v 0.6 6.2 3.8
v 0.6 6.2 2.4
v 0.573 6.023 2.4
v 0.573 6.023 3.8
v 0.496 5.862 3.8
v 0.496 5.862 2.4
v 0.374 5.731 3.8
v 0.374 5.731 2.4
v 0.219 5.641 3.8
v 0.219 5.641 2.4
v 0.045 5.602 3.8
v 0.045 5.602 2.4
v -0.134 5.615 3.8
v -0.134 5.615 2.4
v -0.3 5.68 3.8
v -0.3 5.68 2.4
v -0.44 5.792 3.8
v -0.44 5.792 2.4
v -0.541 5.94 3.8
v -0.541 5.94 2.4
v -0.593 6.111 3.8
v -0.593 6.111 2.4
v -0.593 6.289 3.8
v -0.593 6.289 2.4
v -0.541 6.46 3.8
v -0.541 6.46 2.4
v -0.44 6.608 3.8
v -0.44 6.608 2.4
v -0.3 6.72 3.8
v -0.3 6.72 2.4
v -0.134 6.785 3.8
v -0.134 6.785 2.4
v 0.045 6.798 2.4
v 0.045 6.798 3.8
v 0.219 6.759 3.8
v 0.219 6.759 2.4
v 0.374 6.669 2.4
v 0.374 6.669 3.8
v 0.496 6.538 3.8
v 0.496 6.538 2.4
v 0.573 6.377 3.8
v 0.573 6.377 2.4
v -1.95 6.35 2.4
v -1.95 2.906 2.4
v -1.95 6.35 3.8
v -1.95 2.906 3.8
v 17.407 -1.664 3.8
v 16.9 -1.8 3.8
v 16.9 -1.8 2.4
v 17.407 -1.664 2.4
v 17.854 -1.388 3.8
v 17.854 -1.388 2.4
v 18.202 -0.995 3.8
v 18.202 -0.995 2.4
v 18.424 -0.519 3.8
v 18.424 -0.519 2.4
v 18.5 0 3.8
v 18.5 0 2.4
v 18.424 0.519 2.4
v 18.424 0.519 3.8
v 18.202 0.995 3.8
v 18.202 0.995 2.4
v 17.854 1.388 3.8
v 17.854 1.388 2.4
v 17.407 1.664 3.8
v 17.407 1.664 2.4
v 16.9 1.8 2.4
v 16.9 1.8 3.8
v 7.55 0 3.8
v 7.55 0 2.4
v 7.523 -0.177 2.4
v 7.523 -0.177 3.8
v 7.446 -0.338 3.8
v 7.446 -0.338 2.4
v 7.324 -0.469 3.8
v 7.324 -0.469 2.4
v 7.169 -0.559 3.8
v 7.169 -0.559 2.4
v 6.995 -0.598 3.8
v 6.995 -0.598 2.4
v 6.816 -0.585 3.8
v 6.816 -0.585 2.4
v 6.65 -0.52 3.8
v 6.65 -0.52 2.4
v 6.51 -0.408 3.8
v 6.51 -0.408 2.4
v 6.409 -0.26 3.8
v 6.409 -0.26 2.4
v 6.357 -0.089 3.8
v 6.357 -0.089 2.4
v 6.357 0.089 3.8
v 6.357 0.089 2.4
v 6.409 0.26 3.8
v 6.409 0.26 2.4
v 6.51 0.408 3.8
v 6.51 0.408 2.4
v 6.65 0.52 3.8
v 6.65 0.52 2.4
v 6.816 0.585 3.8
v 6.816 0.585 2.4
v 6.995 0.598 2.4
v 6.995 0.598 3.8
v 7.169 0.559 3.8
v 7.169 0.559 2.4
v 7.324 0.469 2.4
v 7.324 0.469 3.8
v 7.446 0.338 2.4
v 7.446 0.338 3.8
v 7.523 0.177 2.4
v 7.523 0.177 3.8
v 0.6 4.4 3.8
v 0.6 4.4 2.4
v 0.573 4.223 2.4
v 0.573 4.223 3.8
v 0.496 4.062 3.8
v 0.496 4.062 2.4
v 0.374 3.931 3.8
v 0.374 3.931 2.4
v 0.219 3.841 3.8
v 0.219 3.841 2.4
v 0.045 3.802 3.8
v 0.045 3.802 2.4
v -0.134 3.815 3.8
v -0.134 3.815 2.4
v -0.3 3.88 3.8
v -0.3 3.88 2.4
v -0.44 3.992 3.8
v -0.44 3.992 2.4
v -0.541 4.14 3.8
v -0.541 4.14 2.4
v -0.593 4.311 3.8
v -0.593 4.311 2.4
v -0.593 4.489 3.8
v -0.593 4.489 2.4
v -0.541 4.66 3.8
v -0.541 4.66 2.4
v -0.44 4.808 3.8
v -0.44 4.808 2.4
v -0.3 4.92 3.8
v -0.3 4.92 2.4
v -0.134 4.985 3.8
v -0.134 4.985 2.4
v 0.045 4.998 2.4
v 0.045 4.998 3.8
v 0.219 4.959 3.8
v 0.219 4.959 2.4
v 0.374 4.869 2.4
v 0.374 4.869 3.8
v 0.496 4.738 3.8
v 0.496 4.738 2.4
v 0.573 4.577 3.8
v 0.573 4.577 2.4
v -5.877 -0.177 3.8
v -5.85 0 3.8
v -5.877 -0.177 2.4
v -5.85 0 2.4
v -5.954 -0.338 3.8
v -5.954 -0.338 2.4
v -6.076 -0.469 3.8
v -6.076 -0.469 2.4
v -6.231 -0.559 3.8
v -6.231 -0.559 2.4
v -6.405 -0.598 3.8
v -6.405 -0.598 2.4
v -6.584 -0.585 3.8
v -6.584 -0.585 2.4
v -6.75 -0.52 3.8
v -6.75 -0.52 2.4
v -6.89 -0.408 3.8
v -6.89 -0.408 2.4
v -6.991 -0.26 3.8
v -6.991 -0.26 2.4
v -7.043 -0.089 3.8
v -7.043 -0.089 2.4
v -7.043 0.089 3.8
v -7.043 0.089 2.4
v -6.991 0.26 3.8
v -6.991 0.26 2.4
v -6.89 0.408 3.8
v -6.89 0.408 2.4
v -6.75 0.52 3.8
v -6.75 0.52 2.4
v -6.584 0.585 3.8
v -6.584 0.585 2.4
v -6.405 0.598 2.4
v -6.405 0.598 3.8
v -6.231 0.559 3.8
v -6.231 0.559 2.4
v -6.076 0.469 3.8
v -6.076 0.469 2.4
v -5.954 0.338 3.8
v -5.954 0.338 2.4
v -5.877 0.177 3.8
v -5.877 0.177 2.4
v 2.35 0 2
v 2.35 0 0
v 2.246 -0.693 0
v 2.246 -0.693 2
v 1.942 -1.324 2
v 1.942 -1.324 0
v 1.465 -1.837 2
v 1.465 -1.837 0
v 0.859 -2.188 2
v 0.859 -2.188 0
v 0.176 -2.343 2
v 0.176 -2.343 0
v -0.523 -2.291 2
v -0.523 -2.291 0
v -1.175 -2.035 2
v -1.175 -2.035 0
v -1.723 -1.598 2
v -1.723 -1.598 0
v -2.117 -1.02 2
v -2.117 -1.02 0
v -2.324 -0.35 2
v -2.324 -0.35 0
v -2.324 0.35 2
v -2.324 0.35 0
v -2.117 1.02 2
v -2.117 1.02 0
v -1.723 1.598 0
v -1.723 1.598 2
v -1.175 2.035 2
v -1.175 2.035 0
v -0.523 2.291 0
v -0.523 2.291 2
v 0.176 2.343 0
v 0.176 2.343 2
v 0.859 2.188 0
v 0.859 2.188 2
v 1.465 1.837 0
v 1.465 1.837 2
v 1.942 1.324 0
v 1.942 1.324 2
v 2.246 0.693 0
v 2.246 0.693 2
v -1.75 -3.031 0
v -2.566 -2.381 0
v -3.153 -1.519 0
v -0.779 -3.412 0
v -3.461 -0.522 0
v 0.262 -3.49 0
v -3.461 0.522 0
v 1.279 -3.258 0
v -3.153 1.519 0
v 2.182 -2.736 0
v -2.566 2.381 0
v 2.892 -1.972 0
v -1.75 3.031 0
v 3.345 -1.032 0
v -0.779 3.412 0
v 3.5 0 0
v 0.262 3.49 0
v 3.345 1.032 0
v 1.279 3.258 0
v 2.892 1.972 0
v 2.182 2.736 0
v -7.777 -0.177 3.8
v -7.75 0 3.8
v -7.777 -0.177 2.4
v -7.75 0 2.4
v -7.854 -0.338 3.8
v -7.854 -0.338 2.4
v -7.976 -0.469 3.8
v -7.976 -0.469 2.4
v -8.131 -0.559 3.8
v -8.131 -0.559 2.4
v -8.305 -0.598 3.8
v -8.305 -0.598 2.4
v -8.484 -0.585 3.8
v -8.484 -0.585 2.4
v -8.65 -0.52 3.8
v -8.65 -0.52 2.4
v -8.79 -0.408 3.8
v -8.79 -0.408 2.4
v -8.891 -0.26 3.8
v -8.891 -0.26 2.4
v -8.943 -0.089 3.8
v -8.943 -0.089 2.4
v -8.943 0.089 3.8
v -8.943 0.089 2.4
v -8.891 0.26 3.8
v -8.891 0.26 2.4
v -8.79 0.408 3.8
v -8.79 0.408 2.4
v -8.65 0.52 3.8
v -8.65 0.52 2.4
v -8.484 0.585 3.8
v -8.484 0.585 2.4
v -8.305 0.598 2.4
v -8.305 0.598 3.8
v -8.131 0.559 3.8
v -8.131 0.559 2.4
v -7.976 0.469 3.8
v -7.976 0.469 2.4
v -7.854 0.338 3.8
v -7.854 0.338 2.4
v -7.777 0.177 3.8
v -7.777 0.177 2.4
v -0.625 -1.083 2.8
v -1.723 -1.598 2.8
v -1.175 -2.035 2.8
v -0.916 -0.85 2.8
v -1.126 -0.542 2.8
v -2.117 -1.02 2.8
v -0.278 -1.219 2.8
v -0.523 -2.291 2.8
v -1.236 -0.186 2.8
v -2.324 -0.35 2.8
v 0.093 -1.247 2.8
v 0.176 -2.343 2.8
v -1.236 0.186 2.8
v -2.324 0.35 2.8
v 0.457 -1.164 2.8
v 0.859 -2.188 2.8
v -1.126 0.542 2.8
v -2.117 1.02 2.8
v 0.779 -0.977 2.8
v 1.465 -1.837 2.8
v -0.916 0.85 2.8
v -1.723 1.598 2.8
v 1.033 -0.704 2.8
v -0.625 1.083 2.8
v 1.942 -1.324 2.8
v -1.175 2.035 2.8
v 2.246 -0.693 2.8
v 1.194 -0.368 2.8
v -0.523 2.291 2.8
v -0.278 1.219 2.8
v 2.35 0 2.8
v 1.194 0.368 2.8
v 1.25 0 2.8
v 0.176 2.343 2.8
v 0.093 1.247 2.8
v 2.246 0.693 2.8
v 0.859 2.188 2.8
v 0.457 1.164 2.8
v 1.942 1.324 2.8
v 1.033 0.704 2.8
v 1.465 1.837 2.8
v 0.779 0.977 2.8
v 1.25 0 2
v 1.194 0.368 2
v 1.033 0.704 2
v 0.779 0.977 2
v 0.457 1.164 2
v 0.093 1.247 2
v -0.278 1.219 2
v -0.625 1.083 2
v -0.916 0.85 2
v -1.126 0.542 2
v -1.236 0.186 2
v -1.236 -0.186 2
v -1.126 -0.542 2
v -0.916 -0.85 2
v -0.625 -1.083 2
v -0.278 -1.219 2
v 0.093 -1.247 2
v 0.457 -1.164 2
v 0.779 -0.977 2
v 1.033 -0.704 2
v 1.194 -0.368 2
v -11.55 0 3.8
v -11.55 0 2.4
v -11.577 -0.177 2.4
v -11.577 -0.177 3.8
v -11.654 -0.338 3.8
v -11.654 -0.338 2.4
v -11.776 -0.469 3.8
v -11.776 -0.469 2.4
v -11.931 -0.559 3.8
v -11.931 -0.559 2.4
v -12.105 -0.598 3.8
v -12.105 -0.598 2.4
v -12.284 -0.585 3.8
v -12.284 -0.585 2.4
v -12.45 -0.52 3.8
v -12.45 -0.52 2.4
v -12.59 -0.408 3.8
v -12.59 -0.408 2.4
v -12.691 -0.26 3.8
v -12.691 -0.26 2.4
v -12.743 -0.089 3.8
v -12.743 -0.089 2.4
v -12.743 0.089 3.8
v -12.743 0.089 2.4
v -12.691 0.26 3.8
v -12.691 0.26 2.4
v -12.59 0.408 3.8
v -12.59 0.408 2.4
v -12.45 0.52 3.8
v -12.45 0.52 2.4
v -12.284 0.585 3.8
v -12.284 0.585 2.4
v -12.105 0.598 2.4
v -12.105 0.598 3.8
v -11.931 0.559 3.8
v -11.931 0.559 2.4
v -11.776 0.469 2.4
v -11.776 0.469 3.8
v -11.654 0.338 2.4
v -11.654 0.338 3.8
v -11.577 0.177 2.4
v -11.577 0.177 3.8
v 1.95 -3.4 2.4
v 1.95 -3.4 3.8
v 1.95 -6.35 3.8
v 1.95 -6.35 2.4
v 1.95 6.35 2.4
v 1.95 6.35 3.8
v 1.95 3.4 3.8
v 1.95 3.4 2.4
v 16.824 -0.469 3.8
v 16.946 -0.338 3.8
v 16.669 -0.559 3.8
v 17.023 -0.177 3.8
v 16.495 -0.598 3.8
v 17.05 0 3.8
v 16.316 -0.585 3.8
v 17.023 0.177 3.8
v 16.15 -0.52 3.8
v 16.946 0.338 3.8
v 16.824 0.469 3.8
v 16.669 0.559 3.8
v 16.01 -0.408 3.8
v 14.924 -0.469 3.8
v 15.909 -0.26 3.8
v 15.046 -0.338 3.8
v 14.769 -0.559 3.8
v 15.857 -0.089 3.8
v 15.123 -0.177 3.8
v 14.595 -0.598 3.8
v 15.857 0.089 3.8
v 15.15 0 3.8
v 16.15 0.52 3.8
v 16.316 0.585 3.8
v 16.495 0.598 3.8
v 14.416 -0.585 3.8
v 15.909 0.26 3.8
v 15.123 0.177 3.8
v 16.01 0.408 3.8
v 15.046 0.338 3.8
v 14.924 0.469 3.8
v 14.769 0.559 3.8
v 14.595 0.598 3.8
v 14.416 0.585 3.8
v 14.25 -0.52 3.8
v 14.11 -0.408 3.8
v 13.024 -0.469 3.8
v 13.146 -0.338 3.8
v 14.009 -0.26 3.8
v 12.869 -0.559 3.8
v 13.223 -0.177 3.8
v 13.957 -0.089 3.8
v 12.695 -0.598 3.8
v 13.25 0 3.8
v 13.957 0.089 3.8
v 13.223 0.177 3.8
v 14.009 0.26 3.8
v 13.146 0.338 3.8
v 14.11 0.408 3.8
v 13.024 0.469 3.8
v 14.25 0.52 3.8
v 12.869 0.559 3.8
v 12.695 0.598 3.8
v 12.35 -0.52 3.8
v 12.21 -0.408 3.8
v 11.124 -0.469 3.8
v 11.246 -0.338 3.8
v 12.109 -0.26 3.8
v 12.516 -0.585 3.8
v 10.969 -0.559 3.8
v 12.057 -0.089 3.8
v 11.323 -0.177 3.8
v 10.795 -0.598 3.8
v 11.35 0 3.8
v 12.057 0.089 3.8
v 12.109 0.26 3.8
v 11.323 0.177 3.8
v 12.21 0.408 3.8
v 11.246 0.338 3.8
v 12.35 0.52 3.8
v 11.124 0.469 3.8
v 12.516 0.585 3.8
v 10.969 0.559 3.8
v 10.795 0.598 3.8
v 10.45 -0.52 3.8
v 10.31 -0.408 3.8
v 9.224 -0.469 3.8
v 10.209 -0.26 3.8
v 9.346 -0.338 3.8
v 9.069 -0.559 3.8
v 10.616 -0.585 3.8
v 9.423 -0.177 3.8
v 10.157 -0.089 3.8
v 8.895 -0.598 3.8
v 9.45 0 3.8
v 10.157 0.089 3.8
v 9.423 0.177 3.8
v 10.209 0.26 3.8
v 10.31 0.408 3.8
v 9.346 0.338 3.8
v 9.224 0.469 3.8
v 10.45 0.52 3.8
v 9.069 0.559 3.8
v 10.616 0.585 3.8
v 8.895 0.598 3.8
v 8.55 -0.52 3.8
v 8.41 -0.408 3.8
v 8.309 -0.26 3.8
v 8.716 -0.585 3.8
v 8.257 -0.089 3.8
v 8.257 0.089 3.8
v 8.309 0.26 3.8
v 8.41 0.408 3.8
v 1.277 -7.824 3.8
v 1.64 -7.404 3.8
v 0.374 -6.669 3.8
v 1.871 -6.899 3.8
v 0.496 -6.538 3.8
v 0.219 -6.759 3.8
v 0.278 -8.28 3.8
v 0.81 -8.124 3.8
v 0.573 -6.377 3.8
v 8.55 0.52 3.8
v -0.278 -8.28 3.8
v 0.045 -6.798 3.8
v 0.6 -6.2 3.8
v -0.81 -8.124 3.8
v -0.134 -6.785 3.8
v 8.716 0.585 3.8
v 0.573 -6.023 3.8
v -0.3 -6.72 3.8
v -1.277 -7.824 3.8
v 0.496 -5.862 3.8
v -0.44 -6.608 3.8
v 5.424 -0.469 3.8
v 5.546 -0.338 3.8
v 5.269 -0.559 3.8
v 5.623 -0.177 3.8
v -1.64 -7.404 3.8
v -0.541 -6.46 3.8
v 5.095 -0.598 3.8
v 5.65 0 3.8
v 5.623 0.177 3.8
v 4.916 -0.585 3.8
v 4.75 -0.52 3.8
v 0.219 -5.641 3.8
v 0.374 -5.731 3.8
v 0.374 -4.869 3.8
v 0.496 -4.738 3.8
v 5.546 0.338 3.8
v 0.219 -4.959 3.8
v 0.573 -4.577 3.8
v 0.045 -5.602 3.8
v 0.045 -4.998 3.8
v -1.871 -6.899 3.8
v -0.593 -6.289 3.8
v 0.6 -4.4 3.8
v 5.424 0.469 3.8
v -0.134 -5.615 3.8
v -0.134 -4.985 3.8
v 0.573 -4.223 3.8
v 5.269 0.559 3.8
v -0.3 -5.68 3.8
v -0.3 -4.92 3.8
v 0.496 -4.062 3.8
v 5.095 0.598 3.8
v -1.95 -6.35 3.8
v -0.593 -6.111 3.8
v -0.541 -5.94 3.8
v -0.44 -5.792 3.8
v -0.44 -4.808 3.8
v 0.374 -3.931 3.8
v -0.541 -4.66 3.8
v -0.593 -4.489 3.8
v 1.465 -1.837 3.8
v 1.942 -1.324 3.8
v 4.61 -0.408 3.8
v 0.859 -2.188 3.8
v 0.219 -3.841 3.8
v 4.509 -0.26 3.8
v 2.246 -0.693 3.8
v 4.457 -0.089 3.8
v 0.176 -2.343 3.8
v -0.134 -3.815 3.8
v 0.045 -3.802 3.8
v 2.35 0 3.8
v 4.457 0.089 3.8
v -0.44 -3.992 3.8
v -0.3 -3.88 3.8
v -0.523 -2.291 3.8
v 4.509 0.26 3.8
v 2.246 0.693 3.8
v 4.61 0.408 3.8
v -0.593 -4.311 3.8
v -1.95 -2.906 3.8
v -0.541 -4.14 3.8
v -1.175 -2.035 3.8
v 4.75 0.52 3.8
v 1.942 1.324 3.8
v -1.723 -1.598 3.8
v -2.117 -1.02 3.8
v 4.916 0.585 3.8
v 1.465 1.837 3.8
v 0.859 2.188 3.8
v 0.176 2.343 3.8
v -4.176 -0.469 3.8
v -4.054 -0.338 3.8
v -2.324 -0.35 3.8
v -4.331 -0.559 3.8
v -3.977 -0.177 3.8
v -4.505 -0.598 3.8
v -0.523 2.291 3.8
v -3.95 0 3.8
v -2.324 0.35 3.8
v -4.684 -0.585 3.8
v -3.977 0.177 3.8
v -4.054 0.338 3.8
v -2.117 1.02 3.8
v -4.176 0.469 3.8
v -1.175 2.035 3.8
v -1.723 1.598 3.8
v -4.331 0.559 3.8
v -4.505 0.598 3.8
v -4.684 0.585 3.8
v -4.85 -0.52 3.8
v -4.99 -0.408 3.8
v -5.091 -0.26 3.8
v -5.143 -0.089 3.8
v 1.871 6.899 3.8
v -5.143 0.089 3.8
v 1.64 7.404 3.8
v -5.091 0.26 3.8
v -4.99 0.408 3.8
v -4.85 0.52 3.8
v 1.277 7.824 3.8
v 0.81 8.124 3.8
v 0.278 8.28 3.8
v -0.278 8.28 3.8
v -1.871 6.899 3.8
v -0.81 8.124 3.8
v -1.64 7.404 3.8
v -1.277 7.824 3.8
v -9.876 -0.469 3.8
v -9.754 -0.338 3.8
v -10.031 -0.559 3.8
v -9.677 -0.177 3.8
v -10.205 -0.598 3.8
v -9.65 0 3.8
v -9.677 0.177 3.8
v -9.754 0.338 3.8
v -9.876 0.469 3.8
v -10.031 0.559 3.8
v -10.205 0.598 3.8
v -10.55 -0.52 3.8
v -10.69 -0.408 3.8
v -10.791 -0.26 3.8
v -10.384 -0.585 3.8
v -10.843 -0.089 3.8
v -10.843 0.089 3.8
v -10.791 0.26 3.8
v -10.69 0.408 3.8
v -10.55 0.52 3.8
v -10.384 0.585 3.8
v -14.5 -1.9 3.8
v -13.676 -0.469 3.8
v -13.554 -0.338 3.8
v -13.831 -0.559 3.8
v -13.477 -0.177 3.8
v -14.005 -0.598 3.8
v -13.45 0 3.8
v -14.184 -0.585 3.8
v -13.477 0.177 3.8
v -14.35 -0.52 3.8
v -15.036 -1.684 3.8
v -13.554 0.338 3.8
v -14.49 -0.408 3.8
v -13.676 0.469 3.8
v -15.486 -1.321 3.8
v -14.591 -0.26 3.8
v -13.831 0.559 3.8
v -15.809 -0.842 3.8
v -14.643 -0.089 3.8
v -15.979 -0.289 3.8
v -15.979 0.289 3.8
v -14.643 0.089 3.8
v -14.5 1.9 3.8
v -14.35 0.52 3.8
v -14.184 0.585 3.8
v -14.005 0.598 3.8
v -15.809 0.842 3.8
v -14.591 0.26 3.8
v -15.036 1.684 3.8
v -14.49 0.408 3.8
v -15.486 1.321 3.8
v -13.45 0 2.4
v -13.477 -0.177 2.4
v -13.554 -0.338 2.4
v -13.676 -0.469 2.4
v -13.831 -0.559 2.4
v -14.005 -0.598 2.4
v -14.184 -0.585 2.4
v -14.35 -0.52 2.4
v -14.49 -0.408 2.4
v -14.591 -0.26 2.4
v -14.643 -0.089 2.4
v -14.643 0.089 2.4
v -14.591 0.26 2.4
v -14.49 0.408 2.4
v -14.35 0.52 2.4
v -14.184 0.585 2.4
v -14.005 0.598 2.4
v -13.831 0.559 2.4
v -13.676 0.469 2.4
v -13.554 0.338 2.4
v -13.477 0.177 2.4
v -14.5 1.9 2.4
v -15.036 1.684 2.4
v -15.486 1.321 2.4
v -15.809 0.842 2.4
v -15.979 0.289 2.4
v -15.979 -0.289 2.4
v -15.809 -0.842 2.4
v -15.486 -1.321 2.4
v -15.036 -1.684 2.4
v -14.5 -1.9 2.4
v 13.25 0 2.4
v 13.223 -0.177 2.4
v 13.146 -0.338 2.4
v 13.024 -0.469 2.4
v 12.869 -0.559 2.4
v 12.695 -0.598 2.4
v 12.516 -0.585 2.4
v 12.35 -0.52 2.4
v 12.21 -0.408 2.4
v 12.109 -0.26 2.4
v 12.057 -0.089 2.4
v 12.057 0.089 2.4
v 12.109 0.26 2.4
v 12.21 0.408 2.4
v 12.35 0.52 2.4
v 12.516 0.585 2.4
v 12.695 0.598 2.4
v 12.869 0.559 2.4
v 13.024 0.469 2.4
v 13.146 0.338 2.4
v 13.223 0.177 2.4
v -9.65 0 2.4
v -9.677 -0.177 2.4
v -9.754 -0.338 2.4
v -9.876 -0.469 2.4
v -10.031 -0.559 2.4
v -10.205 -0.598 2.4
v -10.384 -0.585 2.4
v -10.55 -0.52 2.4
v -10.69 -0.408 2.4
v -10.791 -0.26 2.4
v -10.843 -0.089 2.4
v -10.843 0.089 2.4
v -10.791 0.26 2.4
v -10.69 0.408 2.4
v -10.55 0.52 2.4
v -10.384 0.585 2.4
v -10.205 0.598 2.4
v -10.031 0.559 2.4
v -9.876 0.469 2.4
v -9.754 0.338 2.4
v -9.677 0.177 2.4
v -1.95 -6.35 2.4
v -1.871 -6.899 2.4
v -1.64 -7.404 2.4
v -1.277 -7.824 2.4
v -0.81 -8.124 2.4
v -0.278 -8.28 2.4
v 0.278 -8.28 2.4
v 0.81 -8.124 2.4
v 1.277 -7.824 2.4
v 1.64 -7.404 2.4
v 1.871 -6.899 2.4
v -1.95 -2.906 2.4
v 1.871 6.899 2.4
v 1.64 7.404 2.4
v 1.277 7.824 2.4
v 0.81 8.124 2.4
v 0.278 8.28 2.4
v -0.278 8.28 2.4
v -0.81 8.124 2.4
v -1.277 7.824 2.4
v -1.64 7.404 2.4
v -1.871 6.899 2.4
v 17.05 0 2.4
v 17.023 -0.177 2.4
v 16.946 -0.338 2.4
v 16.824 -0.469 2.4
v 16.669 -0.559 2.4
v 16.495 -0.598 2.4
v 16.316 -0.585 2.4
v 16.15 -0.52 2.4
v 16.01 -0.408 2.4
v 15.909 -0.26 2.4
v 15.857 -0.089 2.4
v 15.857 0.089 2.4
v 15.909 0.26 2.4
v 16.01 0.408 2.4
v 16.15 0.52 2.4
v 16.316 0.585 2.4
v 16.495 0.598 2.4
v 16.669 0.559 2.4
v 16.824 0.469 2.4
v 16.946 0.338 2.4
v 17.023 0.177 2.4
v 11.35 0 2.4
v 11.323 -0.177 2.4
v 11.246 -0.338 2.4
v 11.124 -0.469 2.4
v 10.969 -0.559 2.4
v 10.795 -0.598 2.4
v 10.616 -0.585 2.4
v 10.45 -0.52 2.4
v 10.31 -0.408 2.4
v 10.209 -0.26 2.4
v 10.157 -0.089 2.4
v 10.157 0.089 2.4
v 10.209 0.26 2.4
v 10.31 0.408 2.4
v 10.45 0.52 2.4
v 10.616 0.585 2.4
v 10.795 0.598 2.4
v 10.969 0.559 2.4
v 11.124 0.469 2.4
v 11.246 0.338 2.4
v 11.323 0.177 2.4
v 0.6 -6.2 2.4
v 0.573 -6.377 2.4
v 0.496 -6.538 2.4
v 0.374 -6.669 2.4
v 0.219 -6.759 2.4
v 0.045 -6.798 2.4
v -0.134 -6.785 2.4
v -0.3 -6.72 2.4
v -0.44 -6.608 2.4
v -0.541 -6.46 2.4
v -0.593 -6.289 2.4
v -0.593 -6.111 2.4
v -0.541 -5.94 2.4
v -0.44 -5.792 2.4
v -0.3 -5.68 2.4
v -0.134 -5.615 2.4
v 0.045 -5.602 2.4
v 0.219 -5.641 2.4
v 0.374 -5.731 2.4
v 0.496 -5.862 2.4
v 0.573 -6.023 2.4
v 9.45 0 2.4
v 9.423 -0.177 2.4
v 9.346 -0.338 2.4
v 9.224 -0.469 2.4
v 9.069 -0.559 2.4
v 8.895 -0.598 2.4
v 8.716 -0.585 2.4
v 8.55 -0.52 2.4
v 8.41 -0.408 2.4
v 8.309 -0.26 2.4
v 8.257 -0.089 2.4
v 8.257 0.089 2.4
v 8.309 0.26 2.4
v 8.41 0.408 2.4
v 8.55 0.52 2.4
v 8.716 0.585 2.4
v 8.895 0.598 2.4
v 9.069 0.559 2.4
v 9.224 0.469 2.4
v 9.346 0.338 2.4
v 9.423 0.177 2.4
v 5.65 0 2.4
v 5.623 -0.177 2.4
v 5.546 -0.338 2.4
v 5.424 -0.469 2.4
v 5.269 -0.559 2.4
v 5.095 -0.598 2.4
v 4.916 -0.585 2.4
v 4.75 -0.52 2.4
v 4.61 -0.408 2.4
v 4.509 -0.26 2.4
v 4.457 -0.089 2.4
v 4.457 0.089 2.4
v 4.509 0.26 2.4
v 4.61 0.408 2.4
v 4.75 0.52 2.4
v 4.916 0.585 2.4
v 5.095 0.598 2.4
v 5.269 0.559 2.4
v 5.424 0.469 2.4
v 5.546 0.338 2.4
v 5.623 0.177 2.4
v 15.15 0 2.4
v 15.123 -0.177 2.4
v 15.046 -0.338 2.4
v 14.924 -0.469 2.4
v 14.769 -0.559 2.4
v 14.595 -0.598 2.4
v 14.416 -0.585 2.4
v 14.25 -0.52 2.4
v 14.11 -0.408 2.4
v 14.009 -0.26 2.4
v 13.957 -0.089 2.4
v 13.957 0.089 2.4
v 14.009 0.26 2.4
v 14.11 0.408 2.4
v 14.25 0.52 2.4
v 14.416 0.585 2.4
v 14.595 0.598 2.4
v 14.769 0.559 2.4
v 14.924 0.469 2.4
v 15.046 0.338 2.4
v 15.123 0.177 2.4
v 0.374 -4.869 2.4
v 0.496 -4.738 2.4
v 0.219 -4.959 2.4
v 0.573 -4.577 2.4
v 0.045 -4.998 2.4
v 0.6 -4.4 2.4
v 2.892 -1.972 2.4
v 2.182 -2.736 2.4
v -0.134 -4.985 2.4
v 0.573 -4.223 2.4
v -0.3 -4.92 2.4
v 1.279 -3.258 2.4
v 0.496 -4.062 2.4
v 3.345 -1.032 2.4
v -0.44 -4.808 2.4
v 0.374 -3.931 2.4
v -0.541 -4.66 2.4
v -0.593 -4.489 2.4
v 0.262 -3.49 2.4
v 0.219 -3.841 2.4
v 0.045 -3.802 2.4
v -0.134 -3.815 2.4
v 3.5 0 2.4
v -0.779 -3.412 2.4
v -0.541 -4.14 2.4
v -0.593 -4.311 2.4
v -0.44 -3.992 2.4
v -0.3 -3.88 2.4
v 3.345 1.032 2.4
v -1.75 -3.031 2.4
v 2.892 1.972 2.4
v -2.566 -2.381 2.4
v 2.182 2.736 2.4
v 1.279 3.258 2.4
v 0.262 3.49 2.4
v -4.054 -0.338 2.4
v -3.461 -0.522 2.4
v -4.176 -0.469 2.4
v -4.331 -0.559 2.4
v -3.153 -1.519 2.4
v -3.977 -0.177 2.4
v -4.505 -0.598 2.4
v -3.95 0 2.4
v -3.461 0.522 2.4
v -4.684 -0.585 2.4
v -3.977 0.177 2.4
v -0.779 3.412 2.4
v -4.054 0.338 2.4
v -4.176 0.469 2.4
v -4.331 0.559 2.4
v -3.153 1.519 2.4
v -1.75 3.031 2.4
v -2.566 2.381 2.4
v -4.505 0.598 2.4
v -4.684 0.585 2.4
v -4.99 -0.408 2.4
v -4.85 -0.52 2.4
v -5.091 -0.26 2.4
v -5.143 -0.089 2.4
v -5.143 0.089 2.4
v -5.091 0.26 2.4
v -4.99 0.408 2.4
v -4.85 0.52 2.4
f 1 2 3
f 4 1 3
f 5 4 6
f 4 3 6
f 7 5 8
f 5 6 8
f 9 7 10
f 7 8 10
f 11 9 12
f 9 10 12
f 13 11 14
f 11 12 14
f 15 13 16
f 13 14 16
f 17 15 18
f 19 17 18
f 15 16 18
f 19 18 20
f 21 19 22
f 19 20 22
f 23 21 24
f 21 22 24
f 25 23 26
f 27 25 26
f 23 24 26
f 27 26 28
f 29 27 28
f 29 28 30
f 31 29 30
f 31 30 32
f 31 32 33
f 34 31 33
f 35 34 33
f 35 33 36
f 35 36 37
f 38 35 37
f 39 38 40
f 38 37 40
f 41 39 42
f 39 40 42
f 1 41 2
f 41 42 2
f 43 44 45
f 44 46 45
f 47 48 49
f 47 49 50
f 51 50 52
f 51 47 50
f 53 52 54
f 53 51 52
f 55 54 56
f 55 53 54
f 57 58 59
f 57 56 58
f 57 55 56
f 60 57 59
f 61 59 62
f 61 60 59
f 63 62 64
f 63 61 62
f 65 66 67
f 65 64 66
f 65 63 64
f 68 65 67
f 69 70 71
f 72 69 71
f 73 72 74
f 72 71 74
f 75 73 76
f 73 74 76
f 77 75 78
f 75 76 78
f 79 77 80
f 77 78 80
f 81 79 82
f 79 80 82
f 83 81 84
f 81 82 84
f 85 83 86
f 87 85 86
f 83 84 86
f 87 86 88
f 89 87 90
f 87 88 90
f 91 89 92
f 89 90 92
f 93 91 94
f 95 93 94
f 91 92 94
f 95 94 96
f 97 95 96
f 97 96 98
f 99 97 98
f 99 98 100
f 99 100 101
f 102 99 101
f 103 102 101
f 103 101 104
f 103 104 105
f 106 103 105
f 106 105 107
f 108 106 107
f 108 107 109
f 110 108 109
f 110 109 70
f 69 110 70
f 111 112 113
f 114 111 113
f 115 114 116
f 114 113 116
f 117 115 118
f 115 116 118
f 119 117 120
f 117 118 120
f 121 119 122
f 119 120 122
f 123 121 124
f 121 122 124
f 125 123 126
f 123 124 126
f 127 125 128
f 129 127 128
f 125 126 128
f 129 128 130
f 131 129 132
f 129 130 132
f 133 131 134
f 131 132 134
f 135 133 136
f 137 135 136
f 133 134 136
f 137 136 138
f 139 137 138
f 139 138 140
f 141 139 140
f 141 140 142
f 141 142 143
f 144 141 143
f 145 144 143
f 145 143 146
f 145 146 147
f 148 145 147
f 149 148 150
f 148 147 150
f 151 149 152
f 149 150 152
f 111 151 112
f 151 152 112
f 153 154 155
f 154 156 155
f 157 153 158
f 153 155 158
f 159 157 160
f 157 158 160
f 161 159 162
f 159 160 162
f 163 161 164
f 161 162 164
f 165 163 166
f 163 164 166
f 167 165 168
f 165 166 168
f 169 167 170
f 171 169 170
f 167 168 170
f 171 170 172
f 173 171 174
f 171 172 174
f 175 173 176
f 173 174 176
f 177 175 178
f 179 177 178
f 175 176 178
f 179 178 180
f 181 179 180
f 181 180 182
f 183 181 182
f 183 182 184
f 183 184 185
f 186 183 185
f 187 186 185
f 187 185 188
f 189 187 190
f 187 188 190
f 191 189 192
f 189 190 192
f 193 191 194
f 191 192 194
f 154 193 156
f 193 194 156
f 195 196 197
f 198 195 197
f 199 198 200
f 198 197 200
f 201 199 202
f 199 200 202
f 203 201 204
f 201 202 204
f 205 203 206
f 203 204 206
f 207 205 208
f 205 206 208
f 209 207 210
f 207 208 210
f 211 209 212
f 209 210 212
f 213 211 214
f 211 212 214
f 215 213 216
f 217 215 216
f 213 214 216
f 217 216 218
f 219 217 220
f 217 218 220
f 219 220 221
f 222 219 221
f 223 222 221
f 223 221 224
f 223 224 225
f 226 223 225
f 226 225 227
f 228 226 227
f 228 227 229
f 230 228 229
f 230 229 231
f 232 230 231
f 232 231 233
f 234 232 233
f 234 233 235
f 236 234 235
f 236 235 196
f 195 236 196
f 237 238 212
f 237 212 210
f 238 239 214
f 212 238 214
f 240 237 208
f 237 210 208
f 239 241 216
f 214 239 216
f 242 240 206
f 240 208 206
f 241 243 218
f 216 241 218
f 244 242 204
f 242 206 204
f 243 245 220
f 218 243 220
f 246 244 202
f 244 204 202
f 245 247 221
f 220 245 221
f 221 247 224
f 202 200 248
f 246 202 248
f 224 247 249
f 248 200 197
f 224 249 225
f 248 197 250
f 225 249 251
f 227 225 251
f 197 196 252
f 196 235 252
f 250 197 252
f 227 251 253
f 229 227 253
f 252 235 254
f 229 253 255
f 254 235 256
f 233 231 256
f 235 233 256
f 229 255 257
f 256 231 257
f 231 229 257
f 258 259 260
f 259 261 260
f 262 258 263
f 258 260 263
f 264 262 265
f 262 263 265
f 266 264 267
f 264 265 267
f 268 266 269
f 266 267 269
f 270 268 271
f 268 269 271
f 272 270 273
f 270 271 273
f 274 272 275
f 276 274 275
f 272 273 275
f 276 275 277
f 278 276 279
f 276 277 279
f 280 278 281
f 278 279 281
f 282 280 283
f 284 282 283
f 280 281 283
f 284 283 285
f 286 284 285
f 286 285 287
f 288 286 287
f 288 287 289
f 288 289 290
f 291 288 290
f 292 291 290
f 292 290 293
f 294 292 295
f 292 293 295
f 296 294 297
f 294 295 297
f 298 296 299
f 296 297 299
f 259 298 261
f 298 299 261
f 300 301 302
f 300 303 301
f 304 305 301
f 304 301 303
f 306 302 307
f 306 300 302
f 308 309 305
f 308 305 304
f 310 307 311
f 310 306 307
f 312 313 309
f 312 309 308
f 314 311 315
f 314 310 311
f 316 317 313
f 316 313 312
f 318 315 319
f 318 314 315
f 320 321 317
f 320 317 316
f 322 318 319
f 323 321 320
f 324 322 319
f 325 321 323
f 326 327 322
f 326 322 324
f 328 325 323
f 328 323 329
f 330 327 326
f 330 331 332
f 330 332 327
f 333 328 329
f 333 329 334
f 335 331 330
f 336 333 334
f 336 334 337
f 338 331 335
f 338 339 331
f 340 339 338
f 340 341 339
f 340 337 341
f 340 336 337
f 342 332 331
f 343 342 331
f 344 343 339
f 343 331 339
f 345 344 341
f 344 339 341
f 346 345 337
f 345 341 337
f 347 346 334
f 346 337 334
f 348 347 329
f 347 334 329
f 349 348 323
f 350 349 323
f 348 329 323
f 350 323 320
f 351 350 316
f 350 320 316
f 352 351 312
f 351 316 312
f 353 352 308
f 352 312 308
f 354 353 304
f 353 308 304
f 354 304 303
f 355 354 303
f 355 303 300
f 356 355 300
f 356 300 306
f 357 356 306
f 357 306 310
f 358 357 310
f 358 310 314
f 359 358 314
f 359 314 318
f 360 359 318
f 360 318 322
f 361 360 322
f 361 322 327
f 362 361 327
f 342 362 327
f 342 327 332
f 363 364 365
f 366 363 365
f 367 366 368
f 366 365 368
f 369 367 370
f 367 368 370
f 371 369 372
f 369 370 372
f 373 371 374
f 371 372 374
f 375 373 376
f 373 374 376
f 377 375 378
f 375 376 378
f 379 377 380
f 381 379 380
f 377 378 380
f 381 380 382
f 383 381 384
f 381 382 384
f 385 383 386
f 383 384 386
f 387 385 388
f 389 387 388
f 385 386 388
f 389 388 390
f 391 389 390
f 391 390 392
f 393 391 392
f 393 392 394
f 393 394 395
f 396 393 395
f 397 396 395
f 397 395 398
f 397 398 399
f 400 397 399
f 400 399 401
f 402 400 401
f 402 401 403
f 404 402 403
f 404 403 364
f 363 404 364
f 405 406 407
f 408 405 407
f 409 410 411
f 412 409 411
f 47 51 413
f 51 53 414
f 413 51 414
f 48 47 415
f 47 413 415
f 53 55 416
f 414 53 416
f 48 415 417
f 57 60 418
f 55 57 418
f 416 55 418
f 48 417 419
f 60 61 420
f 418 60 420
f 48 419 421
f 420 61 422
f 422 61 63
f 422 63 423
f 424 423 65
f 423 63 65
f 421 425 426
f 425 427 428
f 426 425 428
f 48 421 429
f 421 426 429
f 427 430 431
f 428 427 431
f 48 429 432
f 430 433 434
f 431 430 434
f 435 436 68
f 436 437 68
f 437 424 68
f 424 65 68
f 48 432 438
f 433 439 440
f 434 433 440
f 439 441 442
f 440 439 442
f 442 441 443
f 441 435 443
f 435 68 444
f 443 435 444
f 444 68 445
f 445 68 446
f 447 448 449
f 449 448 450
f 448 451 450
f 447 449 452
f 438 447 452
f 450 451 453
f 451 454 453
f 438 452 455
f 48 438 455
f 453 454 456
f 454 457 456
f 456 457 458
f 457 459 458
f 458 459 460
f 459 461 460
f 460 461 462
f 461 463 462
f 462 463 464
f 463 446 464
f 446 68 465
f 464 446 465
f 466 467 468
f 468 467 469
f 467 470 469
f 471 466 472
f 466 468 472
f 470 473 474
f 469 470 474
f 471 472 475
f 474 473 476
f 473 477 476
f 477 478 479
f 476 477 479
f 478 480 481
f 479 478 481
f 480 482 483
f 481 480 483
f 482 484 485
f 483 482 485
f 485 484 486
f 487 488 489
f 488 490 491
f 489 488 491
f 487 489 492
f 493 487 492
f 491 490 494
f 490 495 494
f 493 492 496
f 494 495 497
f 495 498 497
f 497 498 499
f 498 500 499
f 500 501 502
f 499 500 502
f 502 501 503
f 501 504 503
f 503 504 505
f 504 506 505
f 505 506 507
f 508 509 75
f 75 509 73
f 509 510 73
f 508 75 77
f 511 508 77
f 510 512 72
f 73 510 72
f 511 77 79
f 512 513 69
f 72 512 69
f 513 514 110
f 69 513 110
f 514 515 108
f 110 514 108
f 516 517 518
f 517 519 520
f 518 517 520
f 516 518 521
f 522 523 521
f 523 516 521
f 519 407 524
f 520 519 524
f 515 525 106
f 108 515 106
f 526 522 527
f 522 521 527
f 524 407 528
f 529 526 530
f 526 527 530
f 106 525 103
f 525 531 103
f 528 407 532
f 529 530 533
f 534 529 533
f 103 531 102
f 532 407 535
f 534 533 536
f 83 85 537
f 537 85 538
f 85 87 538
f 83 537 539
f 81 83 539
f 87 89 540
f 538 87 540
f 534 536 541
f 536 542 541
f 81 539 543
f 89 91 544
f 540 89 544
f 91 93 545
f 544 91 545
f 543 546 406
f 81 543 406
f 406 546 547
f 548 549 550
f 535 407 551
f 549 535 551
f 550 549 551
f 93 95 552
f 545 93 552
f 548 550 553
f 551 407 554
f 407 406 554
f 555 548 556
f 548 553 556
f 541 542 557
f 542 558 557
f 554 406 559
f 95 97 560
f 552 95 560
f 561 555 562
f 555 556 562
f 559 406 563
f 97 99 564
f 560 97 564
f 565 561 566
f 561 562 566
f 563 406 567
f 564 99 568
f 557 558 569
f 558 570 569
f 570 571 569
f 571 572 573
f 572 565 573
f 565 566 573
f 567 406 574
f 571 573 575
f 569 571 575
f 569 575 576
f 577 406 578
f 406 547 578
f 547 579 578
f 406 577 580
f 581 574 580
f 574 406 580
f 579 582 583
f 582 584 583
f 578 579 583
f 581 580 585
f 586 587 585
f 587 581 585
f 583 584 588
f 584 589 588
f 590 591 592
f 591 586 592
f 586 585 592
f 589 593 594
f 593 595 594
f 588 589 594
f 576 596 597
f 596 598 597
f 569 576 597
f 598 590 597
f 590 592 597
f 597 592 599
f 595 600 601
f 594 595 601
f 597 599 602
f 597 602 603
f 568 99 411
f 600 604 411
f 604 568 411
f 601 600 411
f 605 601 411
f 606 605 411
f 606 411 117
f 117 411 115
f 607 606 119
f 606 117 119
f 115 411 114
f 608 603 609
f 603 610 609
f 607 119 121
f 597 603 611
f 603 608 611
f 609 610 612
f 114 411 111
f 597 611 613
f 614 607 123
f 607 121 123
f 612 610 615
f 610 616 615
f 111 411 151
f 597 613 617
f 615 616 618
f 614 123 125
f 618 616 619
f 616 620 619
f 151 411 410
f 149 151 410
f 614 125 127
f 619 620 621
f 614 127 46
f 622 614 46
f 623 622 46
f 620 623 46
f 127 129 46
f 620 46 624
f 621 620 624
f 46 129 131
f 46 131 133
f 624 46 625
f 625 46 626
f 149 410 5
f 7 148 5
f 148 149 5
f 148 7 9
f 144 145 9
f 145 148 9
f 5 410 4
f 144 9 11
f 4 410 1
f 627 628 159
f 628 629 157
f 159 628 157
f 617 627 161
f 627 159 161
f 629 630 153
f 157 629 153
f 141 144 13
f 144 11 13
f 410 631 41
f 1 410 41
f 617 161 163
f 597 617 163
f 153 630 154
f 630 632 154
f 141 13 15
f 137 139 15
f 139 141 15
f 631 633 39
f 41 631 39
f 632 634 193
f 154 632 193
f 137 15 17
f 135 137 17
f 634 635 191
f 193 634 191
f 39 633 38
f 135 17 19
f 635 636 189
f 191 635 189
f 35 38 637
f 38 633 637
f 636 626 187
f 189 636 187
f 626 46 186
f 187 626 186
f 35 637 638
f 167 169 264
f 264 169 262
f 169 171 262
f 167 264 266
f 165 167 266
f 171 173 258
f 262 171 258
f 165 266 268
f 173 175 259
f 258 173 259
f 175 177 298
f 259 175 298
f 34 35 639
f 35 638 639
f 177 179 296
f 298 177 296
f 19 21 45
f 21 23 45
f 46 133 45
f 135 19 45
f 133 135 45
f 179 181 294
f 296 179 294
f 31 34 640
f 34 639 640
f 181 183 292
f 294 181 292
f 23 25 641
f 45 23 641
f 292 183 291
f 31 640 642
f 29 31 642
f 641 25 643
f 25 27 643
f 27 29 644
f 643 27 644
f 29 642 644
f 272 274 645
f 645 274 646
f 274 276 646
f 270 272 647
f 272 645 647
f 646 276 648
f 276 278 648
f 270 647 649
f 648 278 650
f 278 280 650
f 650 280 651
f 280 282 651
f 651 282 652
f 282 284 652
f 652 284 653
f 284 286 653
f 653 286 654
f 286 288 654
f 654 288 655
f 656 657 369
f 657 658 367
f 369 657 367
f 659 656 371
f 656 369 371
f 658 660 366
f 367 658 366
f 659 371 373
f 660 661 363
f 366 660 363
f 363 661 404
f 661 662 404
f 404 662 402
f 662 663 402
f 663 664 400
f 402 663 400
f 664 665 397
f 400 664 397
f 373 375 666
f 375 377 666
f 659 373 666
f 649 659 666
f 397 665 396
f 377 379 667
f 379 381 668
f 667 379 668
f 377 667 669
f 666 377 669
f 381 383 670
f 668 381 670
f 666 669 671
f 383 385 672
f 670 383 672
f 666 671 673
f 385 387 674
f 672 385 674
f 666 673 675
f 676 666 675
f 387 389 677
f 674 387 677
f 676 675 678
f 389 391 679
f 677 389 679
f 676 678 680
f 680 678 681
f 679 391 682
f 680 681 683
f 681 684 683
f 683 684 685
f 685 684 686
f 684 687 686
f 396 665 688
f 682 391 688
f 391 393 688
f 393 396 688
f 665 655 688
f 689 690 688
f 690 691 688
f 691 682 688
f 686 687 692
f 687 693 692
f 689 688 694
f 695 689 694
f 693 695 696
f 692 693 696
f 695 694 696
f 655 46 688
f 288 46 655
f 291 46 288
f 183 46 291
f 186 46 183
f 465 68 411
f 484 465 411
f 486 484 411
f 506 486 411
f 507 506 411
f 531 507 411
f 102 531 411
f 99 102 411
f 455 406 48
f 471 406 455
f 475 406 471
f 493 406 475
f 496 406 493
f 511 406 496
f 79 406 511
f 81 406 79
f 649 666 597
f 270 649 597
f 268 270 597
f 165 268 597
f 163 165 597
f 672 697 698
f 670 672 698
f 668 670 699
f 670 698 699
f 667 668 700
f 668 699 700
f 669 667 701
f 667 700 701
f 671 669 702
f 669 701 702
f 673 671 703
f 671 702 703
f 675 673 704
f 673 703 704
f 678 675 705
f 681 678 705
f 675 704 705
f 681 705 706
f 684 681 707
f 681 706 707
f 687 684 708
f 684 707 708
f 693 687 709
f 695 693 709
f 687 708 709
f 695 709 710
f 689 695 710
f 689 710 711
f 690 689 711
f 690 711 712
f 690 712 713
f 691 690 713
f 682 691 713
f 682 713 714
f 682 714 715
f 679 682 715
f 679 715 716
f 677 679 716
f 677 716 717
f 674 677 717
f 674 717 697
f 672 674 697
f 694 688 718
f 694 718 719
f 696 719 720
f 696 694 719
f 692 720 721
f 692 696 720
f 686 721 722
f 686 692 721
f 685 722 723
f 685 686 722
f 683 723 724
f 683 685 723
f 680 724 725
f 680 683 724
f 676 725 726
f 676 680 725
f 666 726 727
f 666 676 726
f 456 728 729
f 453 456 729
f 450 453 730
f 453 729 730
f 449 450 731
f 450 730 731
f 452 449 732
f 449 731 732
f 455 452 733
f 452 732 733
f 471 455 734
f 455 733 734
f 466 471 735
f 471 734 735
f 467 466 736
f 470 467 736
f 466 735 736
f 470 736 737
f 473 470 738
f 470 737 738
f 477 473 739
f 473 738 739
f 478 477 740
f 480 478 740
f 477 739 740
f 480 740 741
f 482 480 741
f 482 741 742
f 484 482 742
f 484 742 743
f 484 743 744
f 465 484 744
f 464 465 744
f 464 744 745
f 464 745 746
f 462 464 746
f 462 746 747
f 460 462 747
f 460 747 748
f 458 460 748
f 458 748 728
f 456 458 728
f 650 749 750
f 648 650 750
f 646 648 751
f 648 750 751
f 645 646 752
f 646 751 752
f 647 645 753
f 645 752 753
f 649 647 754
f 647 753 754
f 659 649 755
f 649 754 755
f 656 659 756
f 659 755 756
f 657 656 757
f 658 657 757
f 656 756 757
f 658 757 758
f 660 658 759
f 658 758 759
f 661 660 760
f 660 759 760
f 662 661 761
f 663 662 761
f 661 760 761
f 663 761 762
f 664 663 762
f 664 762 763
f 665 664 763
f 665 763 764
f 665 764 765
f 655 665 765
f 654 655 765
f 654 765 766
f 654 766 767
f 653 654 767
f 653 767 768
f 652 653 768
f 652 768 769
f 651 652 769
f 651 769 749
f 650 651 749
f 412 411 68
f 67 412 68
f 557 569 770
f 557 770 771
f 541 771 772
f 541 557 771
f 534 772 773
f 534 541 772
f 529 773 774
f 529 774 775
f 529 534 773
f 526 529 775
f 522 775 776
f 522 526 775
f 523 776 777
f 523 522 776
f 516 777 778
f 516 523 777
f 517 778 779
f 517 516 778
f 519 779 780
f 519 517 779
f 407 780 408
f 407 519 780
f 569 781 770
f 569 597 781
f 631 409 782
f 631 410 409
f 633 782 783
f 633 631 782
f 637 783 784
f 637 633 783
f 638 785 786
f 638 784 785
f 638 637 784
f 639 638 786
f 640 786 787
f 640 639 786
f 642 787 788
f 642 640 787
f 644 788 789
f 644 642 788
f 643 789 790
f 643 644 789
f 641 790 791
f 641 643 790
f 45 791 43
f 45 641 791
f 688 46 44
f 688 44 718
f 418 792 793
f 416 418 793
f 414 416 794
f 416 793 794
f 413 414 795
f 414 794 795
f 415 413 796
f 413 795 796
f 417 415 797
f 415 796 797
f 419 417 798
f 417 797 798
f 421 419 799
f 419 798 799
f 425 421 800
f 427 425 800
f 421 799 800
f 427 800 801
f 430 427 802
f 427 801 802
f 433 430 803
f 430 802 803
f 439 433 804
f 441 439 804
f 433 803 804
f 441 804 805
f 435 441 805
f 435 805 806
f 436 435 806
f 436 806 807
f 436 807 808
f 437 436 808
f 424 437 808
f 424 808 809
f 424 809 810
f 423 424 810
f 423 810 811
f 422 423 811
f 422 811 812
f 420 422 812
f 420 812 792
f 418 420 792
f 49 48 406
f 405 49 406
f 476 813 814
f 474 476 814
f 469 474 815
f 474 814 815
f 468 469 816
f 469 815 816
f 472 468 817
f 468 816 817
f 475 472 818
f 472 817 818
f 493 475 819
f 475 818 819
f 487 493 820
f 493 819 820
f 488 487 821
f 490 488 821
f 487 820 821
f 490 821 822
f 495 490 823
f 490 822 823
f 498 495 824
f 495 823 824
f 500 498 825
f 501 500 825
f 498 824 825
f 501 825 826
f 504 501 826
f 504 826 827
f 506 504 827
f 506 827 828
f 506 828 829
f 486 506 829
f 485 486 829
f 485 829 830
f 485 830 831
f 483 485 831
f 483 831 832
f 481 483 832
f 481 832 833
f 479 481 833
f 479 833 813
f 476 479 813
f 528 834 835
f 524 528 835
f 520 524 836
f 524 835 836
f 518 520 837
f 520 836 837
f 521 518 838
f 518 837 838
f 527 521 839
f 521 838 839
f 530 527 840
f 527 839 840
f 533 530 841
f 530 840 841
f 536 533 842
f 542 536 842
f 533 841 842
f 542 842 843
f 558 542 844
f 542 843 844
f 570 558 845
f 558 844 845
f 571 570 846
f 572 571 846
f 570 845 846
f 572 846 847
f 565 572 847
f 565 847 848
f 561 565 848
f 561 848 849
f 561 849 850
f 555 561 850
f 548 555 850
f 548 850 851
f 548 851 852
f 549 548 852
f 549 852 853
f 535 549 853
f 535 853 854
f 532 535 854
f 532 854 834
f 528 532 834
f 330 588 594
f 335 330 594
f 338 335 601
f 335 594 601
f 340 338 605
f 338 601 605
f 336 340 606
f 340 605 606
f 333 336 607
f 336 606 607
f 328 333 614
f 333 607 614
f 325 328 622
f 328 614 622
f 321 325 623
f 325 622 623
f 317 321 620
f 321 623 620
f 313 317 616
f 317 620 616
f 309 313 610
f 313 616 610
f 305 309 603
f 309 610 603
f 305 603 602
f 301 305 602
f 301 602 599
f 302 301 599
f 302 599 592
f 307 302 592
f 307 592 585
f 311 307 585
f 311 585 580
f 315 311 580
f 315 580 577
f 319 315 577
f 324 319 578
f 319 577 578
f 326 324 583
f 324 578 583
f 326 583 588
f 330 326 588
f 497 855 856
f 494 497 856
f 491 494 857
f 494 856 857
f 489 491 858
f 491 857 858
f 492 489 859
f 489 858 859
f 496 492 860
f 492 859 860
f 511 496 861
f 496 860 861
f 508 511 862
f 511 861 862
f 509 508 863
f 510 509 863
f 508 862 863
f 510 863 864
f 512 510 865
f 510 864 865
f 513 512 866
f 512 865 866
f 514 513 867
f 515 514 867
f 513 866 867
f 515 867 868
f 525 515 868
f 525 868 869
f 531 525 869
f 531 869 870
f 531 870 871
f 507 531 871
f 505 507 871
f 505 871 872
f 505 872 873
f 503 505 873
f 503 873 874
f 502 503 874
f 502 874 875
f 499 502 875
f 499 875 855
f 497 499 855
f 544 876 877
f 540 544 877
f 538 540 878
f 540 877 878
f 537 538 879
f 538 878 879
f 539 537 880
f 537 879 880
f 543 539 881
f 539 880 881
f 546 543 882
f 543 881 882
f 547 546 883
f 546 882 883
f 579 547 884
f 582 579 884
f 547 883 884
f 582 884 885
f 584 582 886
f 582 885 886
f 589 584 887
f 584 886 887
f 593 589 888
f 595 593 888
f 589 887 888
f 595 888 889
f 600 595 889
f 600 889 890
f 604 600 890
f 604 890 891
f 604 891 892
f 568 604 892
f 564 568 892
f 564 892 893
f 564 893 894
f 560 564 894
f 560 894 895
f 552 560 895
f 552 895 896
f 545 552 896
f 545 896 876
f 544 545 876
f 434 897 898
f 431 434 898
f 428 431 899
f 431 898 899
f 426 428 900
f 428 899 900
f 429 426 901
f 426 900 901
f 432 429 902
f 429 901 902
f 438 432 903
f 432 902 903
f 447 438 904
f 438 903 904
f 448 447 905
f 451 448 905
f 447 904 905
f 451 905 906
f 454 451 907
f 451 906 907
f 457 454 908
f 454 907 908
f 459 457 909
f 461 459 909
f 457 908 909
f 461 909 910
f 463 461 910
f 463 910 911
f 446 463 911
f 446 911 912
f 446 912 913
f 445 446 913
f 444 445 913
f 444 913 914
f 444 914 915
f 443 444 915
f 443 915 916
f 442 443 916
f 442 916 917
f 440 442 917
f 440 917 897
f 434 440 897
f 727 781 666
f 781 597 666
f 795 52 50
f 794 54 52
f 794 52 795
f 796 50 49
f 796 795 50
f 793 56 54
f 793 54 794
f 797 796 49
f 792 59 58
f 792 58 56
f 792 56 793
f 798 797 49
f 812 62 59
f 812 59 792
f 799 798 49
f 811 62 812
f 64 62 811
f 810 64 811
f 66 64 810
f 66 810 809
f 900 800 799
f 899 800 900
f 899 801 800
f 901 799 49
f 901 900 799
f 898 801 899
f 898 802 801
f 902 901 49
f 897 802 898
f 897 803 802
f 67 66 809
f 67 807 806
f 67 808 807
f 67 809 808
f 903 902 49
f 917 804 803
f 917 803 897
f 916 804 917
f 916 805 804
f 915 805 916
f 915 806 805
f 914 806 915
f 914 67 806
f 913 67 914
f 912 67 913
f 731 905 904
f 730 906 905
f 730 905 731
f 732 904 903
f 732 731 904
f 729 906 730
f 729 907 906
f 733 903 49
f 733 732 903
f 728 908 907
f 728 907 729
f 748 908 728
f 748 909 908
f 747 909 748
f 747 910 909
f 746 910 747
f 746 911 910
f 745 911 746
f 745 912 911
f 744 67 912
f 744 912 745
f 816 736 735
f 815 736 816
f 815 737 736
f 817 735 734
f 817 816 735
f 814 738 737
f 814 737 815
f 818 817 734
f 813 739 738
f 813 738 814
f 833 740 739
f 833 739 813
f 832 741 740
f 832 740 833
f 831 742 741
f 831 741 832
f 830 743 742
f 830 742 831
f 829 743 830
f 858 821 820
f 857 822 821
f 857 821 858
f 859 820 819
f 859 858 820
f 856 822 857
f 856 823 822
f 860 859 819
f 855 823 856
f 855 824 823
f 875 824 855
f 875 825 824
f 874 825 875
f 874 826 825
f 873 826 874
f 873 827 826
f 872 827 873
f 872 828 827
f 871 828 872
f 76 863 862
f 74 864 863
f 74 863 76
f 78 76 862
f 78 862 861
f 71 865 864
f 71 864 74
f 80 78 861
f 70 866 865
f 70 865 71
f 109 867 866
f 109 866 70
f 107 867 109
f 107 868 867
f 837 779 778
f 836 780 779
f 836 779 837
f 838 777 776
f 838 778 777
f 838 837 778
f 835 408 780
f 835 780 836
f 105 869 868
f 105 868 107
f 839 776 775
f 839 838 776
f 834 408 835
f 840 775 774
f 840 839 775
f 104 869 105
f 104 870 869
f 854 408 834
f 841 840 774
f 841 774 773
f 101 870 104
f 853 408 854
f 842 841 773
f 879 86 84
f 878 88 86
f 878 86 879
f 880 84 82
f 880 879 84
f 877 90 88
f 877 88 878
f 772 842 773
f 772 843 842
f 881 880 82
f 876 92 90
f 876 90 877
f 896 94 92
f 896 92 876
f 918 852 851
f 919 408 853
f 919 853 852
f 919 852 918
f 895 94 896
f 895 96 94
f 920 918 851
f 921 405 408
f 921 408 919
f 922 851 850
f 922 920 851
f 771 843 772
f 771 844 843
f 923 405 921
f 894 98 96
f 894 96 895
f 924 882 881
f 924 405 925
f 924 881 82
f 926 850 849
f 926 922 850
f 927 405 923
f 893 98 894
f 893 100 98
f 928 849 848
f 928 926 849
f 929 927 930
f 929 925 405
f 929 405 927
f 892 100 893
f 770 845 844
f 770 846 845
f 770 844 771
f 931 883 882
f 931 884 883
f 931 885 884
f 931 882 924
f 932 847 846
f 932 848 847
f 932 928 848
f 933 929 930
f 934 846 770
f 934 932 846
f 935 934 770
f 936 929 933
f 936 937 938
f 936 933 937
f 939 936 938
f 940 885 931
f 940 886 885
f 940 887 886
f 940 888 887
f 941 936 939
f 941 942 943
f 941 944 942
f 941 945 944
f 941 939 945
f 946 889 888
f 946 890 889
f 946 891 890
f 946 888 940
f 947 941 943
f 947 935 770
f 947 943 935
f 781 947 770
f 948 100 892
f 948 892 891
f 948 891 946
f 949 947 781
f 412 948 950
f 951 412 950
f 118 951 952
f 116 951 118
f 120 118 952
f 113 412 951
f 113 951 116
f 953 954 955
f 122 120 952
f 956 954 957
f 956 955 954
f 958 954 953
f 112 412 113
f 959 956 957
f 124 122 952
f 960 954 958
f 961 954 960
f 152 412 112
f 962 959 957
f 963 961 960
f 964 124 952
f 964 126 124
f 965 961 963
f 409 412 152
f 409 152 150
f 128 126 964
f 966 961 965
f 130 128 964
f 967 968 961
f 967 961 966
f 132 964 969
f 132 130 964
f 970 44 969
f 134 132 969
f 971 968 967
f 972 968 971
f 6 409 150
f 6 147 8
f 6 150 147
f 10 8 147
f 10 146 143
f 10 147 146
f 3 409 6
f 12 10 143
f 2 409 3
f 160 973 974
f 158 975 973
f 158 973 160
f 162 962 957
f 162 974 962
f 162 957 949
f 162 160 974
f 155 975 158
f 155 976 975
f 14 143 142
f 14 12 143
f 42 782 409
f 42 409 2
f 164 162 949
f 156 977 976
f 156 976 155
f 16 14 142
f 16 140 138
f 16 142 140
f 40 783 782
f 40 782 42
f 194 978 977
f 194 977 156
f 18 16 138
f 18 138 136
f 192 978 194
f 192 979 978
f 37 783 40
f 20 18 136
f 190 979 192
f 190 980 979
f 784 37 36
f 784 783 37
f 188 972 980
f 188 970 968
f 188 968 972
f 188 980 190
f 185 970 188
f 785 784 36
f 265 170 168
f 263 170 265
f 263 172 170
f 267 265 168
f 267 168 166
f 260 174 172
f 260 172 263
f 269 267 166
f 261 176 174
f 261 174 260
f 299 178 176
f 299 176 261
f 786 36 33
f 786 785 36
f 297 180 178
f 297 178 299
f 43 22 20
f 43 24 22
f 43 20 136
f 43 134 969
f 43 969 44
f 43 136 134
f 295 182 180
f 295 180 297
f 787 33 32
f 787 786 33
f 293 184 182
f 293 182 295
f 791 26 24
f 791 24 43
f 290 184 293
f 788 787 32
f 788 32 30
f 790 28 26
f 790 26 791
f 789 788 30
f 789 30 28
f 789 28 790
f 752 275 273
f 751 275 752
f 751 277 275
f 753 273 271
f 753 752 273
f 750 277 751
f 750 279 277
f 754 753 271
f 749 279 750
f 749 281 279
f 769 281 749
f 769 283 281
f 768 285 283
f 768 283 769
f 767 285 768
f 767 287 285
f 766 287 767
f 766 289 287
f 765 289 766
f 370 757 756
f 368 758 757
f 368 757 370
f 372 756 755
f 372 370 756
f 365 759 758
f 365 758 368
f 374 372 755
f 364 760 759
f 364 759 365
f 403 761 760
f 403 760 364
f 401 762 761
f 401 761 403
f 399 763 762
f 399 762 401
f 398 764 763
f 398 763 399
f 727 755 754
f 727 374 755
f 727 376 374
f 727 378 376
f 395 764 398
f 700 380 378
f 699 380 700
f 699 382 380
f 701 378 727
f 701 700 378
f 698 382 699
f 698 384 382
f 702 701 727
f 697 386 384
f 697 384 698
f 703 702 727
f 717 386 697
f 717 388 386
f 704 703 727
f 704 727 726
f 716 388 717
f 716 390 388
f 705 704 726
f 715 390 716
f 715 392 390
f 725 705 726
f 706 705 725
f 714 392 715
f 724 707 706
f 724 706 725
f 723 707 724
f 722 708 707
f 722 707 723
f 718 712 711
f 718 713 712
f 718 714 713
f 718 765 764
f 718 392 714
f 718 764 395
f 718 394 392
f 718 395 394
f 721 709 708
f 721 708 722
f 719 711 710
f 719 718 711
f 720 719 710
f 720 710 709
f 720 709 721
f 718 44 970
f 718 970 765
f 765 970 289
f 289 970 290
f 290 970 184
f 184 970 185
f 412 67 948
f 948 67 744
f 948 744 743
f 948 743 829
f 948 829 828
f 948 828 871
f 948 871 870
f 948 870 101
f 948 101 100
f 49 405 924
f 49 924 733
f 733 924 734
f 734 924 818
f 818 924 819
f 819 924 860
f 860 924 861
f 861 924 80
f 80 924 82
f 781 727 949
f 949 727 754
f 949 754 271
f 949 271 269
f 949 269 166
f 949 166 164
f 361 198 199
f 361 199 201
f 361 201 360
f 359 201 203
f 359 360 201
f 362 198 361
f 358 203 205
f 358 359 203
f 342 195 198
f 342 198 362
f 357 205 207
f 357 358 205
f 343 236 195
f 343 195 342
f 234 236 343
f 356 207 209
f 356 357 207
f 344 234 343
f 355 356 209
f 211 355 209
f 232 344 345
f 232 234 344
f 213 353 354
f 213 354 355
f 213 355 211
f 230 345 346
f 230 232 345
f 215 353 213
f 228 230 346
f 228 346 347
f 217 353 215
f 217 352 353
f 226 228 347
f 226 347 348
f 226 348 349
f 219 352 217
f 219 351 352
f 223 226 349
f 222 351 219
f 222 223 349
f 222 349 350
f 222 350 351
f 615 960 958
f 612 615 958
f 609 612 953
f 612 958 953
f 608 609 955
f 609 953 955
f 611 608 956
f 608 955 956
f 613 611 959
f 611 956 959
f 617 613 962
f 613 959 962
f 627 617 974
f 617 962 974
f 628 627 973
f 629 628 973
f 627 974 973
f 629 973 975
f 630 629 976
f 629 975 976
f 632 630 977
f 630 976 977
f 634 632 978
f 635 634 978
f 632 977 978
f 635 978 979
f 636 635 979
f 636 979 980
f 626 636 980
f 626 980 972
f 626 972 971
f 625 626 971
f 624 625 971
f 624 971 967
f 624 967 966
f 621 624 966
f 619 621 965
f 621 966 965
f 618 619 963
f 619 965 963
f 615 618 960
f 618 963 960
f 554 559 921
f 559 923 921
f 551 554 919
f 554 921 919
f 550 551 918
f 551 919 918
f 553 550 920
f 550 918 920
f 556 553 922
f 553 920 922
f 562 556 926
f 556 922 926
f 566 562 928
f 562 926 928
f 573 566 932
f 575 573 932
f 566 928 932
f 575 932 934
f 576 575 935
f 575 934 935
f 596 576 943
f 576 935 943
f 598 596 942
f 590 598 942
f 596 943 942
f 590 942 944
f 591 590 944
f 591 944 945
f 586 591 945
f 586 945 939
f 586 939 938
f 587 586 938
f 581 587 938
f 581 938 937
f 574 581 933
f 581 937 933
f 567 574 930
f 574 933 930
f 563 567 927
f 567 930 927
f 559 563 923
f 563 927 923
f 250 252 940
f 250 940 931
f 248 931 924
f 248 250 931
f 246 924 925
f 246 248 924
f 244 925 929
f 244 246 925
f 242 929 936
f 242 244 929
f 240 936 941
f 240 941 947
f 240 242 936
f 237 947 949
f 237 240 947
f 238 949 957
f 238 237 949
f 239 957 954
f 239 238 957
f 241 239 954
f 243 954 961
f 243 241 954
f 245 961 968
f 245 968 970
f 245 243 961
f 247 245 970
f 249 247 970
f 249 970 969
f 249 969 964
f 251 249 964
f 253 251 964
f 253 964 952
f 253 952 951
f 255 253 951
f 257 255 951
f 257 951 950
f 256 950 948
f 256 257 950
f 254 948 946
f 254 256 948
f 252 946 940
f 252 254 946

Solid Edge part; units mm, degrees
sketch "Sketch1" plane through (0, 0, 0) normal (0, 0, 1) x (1, 0, 0)
  circle A0 centre (0, 0) radius 3.5
  dimension "D1" = 7
extrude "Protrusion1" add sketch "Sketch1" along normal blind 3.8
sketch "Sketch2" plane through (0, 0, 3.8) normal (0, 0, 1) x (1, 0, 0)
  circle A0 centre (0, 0) radius 2.35
  dimension "D1" = 4.7
extrude "Extrusionsausschnitt_1" cut sketch "Sketch2" against normal blind 1
sketch "Sketch3" plane through (0, 0, 2.8) normal (0, 0, 1) x (1, 0, 0)
  circle A0 centre (0, 0) radius 1.25
  dimension "D1" = 2.5
extrude "Cutout1" cut sketch "Sketch3" against normal through all
sketch "Sketch4" plane through (0, 0, 0) normal (0, 0, -1) x (1, 0, 0)
  circle A0 centre (0, 0) radius 2.35
  dimension "D1" = 4.7
extrude "Extrusionsausschnitt_3" cut sketch "Sketch4" against normal blind 2
sketch "Sketch5" plane through (0, 0, 3.8) normal (0, 0, 1) x (1, 0, 0)
  line L0 (-1.95, 2.9065) -> (-1.95, 6.35)
  arc A0 (-1.95, 6.35) -> (1.95, 6.35) centre (0, 6.35) cw
  line L1 (1.95, 6.35) -> (1.95, 3.4)
  line L2 (1.95, 3.4) -> (16.9, 1.8)
  arc A1 (16.9, 1.8) -> (16.9, -1.8) centre (16.6875, 0) cw
  line L3 (16.9, -1.8) -> (1.95, -3.4)
  line L4 (1.95, -3.4) -> (1.95, -6.35)
  arc A2 (-1.95, -6.35) -> (1.95, -6.35) centre (0, -6.35) ccw
  line L5 (-1.95, -2.9065) -> (-1.95, -6.35)
  line L6 (-1.95, -2.9065) -> (-14.5, -1.9)
  arc A3 (-14.5, 1.9) -> (-14.5, -1.9) centre (-14.0467, 0) ccw
  line L7 (-1.95, 2.9065) -> (-14.5, 1.9)
  circle A4 centre (0, 0) radius 2.901
  dimension "D1" = 3.9
  dimension "D2" = 16.6
  dimension "D3" = 16
  dimension "D4" = 18.5
  dimension "D5" = 6.8
  dimension "D6" = 3.6
  dimension "D7" = 16.9
  dimension "D8" = 3.8
  dimension "D9" = 14.5
extrude "Extrusionsausprägung_2" add sketch "Sketch5" against normal blind 1.4
sketch "Sketch6" plane through (0, 0, 0) normal (0, 0, 1) x (1, 0, 0)
  circle A0 centre (0, 4.4) radius 0.6
  circle A1 centre (0, 6.2) radius 0.6
  circle A2 centre (0, -6.2) radius 0.6
  circle A3 centre (0, -4.4) radius 0.6
  circle A4 centre (-4.55, 0) radius 0.6
  circle A5 centre (-6.45, 0) radius 0.6
  circle A6 centre (-8.35, 0) radius 0.6
  circle A7 centre (-10.25, 0) radius 0.6
  circle A8 centre (-14.05, 0) radius 0.6
  circle A9 centre (-12.15, 0) radius 0.6
  circle A10 centre (5.05, 0) radius 0.6
  circle A11 centre (6.95, 0) radius 0.6
  circle A12 centre (8.85, 0) radius 0.6
  circle A13 centre (12.65, 0) radius 0.6
  circle A14 centre (14.55, 0) radius 0.6
  circle A15 centre (10.75, 0) radius 0.6
  circle A16 centre (16.45, 0) radius 0.6
extrude "Cutout2" cut sketch "Sketch6" along normal through all
